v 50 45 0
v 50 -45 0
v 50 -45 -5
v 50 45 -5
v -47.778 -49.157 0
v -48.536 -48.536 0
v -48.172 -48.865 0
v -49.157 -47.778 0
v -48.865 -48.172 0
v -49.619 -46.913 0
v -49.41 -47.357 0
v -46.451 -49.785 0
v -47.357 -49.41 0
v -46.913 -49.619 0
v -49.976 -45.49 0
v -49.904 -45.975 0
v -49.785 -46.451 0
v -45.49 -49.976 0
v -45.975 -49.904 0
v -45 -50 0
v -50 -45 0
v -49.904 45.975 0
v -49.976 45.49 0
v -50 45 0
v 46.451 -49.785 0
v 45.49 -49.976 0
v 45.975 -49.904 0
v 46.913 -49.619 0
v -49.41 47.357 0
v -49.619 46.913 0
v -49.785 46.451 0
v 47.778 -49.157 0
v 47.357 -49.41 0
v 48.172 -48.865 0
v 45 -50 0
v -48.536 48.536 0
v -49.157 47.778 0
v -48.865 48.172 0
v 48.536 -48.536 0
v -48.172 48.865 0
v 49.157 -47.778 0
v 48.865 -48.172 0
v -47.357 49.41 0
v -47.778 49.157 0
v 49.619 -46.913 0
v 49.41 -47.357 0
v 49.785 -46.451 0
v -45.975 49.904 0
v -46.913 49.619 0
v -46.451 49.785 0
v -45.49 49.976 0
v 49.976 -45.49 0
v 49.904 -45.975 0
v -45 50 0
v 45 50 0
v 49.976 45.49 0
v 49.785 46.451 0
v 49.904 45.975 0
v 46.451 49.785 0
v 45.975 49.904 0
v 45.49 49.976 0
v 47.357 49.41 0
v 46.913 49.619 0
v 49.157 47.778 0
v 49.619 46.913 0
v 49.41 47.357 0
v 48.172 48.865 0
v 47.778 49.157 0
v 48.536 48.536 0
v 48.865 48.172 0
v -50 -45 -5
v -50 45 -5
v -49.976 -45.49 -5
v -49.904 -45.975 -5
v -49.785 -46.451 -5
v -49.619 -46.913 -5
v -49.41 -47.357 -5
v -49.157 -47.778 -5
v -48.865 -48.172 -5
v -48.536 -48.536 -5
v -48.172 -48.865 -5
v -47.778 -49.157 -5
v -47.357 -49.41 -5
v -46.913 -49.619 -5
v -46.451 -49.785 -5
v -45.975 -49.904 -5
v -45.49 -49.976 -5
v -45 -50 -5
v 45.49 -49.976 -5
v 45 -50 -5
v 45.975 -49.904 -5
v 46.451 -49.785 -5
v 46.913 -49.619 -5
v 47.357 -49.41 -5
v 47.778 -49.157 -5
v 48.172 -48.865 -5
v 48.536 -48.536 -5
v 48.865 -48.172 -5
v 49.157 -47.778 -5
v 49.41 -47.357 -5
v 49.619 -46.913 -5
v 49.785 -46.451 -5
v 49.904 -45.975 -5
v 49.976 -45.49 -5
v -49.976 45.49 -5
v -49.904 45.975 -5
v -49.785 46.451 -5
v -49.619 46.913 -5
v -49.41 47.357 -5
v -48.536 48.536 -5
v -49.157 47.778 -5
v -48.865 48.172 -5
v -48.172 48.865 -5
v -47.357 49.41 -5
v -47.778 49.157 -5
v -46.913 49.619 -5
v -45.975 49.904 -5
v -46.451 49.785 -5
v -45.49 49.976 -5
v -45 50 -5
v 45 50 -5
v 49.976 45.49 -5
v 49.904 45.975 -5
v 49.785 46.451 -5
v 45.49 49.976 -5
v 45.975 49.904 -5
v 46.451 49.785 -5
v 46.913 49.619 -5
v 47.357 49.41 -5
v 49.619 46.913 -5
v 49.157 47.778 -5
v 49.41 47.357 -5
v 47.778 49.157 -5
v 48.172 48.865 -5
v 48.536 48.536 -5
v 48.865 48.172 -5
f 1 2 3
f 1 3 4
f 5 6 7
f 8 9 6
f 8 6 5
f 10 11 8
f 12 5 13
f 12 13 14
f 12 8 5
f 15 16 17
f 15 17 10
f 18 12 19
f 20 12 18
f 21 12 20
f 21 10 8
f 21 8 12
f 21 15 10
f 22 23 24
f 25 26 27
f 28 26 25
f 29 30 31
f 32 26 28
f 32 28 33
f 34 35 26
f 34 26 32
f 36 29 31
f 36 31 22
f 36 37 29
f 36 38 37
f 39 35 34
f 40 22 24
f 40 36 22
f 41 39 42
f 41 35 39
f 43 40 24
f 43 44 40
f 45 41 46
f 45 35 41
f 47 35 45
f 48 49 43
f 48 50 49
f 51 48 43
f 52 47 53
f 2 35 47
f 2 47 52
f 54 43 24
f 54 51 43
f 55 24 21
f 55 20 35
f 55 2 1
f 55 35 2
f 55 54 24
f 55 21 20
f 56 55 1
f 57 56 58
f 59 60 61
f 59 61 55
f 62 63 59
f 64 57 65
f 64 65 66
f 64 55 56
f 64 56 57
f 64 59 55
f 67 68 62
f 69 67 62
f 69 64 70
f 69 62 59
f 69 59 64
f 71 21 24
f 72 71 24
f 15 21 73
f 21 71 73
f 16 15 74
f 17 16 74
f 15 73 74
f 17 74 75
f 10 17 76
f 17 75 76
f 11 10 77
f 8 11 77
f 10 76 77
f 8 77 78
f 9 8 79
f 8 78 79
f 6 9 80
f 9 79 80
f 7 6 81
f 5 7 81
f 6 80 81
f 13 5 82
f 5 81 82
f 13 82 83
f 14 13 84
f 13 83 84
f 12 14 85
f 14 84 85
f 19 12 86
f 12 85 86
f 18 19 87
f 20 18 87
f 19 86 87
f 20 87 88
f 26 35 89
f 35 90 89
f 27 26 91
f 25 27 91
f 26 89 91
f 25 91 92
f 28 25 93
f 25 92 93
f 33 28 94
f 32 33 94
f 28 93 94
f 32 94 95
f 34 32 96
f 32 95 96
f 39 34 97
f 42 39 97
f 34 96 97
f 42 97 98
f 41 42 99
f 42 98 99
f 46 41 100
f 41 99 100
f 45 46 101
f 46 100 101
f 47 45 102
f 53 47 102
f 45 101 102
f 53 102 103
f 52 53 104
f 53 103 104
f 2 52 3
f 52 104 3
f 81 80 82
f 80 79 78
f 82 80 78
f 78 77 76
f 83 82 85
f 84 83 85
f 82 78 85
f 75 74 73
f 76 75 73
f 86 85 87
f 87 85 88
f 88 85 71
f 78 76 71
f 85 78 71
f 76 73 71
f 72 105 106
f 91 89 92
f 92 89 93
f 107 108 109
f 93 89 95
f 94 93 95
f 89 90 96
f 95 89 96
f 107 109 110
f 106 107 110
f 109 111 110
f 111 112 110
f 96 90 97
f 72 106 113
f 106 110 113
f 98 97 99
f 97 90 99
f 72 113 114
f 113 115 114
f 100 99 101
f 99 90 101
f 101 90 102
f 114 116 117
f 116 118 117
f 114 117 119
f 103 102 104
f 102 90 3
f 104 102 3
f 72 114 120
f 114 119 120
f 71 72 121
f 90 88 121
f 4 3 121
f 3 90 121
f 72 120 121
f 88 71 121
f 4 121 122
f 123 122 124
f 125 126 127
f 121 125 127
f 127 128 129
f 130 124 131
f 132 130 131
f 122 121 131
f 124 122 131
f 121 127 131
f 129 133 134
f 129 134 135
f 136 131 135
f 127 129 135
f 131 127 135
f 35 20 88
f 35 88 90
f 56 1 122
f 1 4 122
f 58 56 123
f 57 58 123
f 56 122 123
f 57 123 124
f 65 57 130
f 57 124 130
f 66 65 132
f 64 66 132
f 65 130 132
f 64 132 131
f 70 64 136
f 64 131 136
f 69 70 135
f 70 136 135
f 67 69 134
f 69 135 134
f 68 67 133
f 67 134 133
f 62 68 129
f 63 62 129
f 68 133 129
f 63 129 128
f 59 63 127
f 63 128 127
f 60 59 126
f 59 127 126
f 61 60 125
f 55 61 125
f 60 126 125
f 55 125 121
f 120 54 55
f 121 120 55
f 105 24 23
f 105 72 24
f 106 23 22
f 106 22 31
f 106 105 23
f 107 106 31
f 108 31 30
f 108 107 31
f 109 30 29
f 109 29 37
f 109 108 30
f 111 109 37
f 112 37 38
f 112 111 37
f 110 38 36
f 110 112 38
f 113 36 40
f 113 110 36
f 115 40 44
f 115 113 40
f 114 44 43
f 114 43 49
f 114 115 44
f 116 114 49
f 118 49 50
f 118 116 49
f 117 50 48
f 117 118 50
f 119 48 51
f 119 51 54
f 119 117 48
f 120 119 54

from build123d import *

# Parameters (mm, degrees)
F0_W     = 100
F0_H     = 100
F1_DEPTH = 5
F2_R     = 5


with BuildPart() as f1:
    # F0 (on Top) → F1 (new body)
    with BuildSketch(Plane.XY):
        Rectangle(F0_W, F0_H)
    extrude(amount=-F1_DEPTH)

    # F2
    f2_edges = [f1.edges().sort_by_distance(p)[0] for p in [
        (50, -50, -2.5),
        (-50, -50, -2.5),
        (50, 50, -2.5),
        (-50, 50, -2.5),
    ]]
    fillet(f2_edges, radius=F2_R)


solid = f1.part
